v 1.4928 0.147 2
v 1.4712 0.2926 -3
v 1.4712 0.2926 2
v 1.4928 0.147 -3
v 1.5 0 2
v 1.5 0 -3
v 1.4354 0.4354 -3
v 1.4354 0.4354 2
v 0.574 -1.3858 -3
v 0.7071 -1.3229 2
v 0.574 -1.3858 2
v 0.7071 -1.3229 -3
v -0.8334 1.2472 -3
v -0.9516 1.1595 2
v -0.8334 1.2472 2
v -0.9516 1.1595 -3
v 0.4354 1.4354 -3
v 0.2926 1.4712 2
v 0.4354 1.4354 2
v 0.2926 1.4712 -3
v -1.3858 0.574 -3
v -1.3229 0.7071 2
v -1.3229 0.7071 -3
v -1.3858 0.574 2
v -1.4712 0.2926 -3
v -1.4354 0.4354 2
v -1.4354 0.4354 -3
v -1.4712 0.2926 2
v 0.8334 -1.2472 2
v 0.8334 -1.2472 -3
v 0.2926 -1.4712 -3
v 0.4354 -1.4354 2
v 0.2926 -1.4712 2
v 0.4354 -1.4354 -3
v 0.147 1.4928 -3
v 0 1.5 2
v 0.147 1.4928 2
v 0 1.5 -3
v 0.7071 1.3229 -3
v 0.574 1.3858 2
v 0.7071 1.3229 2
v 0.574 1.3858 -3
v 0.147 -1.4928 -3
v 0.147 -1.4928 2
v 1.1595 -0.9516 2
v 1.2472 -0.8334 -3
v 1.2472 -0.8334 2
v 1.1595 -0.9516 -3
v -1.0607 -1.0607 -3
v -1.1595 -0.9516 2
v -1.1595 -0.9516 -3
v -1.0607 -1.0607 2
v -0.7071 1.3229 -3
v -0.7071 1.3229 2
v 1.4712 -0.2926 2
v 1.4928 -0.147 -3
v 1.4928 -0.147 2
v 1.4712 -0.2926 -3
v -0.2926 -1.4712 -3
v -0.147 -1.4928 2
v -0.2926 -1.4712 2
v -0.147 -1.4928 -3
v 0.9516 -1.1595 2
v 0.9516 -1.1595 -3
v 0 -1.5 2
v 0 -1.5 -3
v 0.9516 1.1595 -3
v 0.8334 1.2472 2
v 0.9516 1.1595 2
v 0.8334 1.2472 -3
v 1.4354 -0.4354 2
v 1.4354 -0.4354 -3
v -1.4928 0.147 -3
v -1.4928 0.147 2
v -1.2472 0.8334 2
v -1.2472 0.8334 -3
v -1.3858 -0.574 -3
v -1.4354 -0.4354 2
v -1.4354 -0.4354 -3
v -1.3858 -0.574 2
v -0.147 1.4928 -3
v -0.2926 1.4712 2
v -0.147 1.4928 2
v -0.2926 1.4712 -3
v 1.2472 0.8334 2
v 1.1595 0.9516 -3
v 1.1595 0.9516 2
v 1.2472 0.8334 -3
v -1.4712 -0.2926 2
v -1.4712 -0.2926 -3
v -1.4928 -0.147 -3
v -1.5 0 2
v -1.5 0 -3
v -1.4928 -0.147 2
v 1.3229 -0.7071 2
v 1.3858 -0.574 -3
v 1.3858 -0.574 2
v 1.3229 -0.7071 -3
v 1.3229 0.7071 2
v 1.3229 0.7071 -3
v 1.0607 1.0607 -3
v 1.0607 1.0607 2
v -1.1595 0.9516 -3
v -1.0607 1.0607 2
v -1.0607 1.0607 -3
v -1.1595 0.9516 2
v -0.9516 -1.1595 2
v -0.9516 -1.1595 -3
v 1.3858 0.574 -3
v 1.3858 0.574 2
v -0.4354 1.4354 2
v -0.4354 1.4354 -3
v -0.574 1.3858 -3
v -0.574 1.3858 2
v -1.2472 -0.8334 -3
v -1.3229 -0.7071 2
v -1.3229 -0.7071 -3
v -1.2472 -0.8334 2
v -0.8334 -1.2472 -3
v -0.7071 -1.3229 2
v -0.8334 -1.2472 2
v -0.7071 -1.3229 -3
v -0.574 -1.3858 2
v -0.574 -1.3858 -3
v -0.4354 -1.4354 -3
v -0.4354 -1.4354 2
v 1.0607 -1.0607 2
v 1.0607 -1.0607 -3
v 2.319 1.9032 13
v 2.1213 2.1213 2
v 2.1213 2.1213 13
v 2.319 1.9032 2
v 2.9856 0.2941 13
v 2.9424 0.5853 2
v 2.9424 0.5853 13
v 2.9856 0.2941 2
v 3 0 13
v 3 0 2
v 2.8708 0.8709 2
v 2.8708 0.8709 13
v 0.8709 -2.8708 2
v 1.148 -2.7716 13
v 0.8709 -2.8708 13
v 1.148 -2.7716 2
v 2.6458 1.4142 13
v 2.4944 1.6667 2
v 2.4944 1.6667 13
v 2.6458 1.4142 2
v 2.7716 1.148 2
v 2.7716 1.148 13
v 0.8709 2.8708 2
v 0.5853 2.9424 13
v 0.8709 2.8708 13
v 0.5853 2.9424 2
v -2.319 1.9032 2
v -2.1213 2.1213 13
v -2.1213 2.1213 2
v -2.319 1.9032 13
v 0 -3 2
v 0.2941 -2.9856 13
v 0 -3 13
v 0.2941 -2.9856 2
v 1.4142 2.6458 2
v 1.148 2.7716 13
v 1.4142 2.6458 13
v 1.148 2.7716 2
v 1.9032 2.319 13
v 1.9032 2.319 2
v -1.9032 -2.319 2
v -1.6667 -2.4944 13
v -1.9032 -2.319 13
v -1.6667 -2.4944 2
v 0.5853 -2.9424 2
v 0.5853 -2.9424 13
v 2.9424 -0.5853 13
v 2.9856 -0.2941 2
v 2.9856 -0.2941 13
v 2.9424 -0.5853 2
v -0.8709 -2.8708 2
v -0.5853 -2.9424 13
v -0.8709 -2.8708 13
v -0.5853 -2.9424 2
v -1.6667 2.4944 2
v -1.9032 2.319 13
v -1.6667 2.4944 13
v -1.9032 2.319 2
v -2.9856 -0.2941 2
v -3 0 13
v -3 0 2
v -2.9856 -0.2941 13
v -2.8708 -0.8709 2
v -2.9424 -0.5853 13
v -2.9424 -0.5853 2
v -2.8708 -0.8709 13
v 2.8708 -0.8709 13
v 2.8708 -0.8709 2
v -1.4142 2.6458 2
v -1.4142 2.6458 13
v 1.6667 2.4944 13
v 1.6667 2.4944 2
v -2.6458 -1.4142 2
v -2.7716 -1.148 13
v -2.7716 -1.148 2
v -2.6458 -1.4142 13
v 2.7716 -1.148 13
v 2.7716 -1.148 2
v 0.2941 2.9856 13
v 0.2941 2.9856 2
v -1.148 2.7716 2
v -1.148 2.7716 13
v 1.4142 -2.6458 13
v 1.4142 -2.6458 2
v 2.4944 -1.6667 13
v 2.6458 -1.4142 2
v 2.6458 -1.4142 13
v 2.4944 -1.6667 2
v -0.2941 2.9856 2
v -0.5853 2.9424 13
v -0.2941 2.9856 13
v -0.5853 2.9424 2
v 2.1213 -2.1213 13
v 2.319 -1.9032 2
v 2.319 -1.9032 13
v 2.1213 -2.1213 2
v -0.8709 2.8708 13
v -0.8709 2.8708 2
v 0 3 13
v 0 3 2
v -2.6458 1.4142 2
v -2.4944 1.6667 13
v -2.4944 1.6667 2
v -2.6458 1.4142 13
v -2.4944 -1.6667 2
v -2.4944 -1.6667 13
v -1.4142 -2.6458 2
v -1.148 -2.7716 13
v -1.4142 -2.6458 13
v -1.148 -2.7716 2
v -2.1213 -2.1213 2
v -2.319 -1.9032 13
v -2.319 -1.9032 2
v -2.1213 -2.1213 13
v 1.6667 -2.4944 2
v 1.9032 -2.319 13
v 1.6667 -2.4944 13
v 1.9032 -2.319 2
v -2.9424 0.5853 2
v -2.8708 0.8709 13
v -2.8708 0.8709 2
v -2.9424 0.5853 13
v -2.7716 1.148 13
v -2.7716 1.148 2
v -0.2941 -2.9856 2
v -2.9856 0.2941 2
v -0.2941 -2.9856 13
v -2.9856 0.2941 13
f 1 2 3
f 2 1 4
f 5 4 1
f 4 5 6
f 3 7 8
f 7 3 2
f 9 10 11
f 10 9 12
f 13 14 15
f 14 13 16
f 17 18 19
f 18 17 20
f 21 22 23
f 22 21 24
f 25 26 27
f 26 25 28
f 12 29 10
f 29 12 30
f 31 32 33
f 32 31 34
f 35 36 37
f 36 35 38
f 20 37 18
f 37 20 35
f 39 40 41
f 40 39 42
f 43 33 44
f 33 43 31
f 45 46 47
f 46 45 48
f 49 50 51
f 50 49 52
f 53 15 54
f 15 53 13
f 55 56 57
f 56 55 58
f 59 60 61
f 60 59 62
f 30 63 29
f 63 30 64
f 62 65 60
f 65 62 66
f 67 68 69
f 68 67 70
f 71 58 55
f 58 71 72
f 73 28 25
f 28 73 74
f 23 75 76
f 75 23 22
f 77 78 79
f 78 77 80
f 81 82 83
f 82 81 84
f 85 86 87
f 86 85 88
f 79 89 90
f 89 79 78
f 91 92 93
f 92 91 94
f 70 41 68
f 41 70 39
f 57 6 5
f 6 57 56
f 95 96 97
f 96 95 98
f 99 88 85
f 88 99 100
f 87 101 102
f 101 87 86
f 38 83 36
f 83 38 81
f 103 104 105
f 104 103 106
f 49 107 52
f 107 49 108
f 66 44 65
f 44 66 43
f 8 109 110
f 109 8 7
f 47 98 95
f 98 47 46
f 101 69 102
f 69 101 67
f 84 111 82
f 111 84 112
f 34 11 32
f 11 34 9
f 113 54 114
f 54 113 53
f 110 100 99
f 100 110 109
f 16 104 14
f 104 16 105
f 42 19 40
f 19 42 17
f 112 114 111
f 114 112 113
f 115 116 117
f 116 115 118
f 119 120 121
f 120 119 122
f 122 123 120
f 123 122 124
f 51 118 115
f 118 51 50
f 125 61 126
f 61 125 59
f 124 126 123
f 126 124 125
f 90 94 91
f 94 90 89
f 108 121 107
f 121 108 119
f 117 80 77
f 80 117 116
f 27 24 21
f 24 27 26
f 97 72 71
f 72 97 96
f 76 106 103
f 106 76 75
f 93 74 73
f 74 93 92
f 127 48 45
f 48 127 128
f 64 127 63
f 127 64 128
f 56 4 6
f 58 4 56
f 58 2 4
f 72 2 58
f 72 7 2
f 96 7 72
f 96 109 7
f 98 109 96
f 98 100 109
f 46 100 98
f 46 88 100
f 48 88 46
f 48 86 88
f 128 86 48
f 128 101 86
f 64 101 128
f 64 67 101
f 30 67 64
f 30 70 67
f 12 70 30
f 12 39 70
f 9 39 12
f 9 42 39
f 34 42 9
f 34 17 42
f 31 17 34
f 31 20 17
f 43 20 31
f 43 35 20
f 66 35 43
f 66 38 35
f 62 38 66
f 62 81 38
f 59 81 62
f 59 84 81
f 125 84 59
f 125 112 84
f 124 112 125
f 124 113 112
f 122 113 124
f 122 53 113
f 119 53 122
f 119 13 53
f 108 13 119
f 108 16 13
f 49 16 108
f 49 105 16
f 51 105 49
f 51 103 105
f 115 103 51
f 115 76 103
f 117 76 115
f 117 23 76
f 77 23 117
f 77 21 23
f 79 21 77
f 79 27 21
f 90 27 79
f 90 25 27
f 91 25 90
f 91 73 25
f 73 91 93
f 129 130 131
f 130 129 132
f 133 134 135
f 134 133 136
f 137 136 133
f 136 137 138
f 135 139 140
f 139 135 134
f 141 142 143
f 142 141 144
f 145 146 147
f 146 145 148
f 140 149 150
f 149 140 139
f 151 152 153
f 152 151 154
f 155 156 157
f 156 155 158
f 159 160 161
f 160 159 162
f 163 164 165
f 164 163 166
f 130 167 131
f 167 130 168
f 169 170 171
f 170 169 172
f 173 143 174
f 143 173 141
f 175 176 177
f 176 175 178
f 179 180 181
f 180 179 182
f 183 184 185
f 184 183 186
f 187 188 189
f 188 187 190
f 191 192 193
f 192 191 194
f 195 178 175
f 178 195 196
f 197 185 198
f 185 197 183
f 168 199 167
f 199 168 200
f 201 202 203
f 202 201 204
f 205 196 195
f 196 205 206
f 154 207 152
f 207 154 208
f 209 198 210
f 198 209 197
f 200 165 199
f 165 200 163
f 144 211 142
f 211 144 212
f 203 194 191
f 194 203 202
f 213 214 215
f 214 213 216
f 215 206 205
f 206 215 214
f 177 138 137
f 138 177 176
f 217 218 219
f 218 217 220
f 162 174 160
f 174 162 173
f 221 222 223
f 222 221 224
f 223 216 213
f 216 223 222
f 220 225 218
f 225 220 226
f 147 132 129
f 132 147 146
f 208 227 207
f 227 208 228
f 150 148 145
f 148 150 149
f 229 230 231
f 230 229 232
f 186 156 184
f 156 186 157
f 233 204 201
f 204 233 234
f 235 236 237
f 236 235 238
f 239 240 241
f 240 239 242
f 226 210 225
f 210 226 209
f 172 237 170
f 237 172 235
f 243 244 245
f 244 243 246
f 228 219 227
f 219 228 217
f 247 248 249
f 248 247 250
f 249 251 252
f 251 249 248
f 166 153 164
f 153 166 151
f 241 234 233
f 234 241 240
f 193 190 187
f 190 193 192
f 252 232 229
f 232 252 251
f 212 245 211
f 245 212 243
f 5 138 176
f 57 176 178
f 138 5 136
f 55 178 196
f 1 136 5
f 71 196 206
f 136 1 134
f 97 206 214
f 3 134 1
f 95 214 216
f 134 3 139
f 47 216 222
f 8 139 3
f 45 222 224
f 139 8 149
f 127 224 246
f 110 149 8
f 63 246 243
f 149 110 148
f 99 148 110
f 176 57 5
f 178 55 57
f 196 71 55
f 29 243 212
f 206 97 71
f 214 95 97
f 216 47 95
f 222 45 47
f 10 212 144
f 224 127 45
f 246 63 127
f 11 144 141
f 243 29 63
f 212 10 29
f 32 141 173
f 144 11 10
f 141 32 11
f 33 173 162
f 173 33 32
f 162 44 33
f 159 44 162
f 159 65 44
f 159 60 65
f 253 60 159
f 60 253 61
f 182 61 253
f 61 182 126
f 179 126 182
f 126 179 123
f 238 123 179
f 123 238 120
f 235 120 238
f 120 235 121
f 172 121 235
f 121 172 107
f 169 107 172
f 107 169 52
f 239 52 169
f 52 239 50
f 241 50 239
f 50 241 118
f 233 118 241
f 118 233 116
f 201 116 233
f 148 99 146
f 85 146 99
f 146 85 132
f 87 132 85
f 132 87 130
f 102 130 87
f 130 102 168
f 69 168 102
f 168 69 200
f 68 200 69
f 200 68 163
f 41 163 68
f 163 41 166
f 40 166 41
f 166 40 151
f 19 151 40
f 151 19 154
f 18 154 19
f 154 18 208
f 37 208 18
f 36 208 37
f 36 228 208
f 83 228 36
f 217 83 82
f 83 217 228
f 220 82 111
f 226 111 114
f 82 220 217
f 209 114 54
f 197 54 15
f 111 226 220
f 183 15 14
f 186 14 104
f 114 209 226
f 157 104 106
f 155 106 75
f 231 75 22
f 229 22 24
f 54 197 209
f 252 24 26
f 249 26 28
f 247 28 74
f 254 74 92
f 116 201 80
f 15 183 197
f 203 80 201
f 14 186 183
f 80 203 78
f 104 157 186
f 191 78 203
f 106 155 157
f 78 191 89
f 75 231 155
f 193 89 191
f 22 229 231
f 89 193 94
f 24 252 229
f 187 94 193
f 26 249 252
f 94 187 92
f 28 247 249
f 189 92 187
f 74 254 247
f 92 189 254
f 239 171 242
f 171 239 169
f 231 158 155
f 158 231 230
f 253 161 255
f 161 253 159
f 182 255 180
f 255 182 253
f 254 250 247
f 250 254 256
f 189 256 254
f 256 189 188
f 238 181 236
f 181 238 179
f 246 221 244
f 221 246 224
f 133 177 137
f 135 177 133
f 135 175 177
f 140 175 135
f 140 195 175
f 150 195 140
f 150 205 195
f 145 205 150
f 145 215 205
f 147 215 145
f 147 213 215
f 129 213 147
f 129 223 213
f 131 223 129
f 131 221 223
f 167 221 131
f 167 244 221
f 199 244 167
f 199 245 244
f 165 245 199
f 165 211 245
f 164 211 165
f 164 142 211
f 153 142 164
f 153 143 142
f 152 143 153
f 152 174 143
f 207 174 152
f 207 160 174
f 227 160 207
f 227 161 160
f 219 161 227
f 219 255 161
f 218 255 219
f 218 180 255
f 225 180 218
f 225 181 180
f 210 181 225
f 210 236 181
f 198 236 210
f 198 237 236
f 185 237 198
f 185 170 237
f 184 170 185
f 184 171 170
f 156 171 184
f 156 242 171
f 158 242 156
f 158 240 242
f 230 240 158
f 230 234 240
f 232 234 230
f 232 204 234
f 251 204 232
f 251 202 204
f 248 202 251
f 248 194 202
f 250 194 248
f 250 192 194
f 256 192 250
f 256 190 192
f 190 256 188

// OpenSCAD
// Parameters
thread_diameter_mm = 3; //[1.5:6:0.1]
length_mm = 6;          //[3:12:0.1]
outer_diameter_mm = 6;  //[3:12:0.1]
interface_length_mm = 6; //[3:12:0.1]
overlap_mm = 1;         //[0.5:2:0.1]

$fn = 64;

// Single connected pillar (no floating sections, no gaps)
module pillar() {
  // Build as three stacked sections that overlap slightly to guarantee attachment:
  // lower dark (thread), middle light (body), upper dark (body)
  lower_h  = interface_length_mm;
  middle_h = length_mm;
  upper_h  = length_mm;

  // Z positions (centered cylinders) with 1-2mm overlap at each interface
  z_lower  = 0;
  z_middle = (lower_h/2 + middle_h/2) - overlap_mm;
  z_upper  = z_middle + (middle_h/2 + upper_h/2) - overlap_mm;

  union() {
    // Lower dark cylindrical section (thread interface)
    color("DimGray")
      translate([0, 0, z_lower])
        cylinder(h=lower_h, r=thread_diameter_mm/2, center=true);

    // Middle light cylindrical section (main body)
    color("Silver")
      translate([0, 0, z_middle])
        cylinder(h=middle_h, r=outer_diameter_mm/2, center=true);

    // Upper dark cylindrical section (main body)
    color("DimGray")
      translate([0, 0, z_upper])
        cylinder(h=upper_h, r=outer_diameter_mm/2, center=true);
  }
}

pillar();
